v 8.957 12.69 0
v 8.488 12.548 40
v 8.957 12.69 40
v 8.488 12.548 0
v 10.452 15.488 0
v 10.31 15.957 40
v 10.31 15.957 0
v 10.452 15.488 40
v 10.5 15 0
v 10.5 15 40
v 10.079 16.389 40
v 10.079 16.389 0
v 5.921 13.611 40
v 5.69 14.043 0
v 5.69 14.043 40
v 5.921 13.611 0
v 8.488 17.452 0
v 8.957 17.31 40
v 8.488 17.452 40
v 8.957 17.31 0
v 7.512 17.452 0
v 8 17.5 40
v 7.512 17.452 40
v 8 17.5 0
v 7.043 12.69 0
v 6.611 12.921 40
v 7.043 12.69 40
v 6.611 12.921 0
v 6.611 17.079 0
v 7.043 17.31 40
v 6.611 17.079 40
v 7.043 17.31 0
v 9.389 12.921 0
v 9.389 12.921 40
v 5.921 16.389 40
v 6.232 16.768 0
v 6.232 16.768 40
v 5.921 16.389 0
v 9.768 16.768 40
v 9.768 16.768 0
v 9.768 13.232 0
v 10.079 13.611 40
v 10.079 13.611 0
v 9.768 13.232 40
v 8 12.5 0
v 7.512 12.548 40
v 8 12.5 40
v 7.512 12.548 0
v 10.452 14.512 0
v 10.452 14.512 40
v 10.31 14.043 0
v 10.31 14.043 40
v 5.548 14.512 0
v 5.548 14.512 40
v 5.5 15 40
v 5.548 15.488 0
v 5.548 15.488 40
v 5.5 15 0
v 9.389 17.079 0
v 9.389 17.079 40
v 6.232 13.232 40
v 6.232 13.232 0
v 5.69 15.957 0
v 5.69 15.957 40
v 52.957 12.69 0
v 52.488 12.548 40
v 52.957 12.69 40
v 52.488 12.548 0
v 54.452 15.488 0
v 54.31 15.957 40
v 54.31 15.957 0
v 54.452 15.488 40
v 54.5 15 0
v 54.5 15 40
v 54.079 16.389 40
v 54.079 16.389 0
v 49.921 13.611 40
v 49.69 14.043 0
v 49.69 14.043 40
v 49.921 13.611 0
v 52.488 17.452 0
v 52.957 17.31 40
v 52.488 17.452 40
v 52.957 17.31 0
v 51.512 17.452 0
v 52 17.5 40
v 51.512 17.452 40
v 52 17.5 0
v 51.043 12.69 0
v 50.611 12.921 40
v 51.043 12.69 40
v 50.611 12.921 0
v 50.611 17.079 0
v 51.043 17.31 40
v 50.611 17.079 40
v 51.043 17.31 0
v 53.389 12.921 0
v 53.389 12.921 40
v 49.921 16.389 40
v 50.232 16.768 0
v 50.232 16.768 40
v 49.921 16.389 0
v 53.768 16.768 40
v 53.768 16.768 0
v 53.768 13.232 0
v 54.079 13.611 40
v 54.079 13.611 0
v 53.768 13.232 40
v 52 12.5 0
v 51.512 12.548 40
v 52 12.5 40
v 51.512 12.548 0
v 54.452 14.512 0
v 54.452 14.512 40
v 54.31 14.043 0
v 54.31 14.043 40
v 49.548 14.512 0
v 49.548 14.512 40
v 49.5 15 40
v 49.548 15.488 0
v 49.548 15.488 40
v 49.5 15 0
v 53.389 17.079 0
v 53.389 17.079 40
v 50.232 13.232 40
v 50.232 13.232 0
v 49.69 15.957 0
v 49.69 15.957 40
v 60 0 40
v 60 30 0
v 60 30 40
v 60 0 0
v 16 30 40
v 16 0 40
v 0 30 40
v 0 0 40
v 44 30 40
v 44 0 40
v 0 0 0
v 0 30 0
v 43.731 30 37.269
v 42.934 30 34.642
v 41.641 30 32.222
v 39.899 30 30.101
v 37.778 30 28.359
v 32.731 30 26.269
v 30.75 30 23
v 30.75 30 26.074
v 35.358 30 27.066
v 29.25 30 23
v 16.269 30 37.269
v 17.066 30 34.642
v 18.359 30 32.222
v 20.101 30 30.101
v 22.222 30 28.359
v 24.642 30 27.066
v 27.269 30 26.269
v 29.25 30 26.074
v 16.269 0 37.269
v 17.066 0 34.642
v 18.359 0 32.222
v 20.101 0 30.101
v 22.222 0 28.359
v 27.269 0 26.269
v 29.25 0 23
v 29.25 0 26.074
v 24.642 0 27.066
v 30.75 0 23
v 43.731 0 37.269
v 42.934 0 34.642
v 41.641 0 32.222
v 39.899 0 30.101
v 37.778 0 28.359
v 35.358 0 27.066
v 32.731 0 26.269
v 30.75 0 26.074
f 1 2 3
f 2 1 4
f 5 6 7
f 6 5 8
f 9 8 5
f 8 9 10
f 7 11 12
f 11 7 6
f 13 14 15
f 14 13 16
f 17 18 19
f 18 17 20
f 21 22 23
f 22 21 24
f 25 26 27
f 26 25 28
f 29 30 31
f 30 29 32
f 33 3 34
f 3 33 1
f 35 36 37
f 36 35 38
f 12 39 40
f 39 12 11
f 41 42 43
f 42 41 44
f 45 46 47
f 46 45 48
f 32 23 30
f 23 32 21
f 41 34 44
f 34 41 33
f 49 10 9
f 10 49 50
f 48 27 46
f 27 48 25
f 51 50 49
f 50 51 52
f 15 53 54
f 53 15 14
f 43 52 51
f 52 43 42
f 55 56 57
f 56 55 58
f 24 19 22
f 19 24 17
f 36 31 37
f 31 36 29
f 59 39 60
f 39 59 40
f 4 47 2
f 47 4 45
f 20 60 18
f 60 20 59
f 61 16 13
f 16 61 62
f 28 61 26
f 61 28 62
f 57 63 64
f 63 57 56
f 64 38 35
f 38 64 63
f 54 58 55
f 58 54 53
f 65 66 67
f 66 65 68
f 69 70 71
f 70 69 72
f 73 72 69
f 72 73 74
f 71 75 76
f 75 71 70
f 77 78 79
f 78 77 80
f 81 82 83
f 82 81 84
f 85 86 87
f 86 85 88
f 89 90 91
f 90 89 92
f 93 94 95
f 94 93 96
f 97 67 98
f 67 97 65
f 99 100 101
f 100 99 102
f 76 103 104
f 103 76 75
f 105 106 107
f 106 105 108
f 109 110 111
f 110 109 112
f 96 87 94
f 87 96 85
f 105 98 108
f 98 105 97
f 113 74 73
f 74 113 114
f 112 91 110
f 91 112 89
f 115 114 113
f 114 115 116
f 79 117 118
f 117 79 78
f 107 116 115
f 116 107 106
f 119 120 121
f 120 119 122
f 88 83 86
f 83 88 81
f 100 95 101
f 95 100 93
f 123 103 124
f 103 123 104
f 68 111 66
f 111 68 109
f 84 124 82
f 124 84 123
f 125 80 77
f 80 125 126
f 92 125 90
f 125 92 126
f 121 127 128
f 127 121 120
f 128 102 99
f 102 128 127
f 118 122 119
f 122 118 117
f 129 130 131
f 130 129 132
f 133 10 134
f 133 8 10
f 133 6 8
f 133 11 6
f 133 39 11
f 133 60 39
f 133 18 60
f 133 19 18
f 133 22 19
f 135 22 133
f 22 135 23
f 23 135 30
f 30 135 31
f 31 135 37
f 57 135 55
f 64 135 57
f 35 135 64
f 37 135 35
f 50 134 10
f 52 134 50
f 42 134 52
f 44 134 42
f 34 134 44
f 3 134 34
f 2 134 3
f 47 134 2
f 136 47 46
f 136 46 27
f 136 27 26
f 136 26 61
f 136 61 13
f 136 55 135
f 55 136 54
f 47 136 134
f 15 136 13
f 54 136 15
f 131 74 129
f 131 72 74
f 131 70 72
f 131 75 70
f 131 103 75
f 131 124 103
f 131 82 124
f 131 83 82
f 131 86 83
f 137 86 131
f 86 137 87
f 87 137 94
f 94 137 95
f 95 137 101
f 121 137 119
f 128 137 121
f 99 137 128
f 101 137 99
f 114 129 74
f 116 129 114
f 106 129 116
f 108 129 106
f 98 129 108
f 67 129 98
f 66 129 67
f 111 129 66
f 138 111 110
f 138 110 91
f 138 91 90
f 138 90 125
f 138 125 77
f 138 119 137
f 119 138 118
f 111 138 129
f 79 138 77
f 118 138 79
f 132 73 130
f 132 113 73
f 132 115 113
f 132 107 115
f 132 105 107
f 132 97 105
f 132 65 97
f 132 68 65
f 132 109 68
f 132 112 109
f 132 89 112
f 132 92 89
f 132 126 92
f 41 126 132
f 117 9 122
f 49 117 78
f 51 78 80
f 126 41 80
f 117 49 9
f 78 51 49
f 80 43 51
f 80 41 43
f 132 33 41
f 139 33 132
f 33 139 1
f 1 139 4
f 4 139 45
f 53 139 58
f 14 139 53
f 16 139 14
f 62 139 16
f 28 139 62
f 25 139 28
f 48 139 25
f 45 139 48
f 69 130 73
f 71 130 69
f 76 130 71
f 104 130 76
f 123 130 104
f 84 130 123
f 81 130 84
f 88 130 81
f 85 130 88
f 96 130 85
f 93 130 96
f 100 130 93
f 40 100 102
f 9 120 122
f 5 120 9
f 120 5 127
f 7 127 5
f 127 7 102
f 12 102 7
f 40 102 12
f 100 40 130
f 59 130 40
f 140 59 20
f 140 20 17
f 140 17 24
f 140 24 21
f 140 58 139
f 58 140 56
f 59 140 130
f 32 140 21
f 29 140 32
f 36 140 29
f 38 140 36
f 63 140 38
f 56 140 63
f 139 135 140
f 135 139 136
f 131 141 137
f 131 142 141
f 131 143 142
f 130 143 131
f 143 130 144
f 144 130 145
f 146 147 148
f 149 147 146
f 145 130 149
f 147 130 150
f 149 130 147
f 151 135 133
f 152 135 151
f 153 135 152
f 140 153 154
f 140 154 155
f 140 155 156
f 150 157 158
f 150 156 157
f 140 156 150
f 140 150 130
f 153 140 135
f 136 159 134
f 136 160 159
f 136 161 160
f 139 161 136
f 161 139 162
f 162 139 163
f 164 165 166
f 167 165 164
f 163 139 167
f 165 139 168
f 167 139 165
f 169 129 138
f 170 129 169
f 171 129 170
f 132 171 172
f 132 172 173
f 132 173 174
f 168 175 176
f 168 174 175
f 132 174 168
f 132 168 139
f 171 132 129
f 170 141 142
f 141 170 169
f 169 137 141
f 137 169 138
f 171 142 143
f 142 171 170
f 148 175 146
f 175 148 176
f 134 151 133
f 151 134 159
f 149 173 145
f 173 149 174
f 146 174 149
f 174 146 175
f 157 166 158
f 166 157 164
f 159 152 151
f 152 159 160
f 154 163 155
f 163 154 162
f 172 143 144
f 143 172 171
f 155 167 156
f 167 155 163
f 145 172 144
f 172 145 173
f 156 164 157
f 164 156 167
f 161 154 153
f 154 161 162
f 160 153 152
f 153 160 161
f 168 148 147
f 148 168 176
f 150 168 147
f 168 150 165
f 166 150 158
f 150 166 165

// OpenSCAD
$fn = 32;

// ----------------------------------------------------------------------
// Saddle clamp: split shaft clamp
// ----------------------------------------------------------------------

// --- parameters (mm) ---
blk_l = 60;               // block length, X
blk_w = 30;               // block width, Y
blk_h = 40;               // block height
clamp_r = 14;             // shaft groove radius
hole_r = 2.5;             // bolt hole radius
hole_m = 8;               // bolt hole margin from the ends
saw_w = 1.5;              // saw kerf width

saw_depth = clamp_r + 3;  // saw kerf depth

difference() {
  cube([blk_l, blk_w, blk_h]);
  translate([blk_l / 2, -1, blk_h])
    rotate([-90, 0, 0])
      cylinder(h = blk_w + 2, r = clamp_r);
  for (sx = [0, 1])
    translate([sx ? blk_l - hole_m : hole_m, blk_w / 2, -1])
      cylinder(r = hole_r, h = blk_h + 2);
  translate([blk_l / 2 - saw_w / 2, -1, blk_h - saw_depth])
    cube([saw_w, blk_w + 2, saw_depth + 1]);
}
